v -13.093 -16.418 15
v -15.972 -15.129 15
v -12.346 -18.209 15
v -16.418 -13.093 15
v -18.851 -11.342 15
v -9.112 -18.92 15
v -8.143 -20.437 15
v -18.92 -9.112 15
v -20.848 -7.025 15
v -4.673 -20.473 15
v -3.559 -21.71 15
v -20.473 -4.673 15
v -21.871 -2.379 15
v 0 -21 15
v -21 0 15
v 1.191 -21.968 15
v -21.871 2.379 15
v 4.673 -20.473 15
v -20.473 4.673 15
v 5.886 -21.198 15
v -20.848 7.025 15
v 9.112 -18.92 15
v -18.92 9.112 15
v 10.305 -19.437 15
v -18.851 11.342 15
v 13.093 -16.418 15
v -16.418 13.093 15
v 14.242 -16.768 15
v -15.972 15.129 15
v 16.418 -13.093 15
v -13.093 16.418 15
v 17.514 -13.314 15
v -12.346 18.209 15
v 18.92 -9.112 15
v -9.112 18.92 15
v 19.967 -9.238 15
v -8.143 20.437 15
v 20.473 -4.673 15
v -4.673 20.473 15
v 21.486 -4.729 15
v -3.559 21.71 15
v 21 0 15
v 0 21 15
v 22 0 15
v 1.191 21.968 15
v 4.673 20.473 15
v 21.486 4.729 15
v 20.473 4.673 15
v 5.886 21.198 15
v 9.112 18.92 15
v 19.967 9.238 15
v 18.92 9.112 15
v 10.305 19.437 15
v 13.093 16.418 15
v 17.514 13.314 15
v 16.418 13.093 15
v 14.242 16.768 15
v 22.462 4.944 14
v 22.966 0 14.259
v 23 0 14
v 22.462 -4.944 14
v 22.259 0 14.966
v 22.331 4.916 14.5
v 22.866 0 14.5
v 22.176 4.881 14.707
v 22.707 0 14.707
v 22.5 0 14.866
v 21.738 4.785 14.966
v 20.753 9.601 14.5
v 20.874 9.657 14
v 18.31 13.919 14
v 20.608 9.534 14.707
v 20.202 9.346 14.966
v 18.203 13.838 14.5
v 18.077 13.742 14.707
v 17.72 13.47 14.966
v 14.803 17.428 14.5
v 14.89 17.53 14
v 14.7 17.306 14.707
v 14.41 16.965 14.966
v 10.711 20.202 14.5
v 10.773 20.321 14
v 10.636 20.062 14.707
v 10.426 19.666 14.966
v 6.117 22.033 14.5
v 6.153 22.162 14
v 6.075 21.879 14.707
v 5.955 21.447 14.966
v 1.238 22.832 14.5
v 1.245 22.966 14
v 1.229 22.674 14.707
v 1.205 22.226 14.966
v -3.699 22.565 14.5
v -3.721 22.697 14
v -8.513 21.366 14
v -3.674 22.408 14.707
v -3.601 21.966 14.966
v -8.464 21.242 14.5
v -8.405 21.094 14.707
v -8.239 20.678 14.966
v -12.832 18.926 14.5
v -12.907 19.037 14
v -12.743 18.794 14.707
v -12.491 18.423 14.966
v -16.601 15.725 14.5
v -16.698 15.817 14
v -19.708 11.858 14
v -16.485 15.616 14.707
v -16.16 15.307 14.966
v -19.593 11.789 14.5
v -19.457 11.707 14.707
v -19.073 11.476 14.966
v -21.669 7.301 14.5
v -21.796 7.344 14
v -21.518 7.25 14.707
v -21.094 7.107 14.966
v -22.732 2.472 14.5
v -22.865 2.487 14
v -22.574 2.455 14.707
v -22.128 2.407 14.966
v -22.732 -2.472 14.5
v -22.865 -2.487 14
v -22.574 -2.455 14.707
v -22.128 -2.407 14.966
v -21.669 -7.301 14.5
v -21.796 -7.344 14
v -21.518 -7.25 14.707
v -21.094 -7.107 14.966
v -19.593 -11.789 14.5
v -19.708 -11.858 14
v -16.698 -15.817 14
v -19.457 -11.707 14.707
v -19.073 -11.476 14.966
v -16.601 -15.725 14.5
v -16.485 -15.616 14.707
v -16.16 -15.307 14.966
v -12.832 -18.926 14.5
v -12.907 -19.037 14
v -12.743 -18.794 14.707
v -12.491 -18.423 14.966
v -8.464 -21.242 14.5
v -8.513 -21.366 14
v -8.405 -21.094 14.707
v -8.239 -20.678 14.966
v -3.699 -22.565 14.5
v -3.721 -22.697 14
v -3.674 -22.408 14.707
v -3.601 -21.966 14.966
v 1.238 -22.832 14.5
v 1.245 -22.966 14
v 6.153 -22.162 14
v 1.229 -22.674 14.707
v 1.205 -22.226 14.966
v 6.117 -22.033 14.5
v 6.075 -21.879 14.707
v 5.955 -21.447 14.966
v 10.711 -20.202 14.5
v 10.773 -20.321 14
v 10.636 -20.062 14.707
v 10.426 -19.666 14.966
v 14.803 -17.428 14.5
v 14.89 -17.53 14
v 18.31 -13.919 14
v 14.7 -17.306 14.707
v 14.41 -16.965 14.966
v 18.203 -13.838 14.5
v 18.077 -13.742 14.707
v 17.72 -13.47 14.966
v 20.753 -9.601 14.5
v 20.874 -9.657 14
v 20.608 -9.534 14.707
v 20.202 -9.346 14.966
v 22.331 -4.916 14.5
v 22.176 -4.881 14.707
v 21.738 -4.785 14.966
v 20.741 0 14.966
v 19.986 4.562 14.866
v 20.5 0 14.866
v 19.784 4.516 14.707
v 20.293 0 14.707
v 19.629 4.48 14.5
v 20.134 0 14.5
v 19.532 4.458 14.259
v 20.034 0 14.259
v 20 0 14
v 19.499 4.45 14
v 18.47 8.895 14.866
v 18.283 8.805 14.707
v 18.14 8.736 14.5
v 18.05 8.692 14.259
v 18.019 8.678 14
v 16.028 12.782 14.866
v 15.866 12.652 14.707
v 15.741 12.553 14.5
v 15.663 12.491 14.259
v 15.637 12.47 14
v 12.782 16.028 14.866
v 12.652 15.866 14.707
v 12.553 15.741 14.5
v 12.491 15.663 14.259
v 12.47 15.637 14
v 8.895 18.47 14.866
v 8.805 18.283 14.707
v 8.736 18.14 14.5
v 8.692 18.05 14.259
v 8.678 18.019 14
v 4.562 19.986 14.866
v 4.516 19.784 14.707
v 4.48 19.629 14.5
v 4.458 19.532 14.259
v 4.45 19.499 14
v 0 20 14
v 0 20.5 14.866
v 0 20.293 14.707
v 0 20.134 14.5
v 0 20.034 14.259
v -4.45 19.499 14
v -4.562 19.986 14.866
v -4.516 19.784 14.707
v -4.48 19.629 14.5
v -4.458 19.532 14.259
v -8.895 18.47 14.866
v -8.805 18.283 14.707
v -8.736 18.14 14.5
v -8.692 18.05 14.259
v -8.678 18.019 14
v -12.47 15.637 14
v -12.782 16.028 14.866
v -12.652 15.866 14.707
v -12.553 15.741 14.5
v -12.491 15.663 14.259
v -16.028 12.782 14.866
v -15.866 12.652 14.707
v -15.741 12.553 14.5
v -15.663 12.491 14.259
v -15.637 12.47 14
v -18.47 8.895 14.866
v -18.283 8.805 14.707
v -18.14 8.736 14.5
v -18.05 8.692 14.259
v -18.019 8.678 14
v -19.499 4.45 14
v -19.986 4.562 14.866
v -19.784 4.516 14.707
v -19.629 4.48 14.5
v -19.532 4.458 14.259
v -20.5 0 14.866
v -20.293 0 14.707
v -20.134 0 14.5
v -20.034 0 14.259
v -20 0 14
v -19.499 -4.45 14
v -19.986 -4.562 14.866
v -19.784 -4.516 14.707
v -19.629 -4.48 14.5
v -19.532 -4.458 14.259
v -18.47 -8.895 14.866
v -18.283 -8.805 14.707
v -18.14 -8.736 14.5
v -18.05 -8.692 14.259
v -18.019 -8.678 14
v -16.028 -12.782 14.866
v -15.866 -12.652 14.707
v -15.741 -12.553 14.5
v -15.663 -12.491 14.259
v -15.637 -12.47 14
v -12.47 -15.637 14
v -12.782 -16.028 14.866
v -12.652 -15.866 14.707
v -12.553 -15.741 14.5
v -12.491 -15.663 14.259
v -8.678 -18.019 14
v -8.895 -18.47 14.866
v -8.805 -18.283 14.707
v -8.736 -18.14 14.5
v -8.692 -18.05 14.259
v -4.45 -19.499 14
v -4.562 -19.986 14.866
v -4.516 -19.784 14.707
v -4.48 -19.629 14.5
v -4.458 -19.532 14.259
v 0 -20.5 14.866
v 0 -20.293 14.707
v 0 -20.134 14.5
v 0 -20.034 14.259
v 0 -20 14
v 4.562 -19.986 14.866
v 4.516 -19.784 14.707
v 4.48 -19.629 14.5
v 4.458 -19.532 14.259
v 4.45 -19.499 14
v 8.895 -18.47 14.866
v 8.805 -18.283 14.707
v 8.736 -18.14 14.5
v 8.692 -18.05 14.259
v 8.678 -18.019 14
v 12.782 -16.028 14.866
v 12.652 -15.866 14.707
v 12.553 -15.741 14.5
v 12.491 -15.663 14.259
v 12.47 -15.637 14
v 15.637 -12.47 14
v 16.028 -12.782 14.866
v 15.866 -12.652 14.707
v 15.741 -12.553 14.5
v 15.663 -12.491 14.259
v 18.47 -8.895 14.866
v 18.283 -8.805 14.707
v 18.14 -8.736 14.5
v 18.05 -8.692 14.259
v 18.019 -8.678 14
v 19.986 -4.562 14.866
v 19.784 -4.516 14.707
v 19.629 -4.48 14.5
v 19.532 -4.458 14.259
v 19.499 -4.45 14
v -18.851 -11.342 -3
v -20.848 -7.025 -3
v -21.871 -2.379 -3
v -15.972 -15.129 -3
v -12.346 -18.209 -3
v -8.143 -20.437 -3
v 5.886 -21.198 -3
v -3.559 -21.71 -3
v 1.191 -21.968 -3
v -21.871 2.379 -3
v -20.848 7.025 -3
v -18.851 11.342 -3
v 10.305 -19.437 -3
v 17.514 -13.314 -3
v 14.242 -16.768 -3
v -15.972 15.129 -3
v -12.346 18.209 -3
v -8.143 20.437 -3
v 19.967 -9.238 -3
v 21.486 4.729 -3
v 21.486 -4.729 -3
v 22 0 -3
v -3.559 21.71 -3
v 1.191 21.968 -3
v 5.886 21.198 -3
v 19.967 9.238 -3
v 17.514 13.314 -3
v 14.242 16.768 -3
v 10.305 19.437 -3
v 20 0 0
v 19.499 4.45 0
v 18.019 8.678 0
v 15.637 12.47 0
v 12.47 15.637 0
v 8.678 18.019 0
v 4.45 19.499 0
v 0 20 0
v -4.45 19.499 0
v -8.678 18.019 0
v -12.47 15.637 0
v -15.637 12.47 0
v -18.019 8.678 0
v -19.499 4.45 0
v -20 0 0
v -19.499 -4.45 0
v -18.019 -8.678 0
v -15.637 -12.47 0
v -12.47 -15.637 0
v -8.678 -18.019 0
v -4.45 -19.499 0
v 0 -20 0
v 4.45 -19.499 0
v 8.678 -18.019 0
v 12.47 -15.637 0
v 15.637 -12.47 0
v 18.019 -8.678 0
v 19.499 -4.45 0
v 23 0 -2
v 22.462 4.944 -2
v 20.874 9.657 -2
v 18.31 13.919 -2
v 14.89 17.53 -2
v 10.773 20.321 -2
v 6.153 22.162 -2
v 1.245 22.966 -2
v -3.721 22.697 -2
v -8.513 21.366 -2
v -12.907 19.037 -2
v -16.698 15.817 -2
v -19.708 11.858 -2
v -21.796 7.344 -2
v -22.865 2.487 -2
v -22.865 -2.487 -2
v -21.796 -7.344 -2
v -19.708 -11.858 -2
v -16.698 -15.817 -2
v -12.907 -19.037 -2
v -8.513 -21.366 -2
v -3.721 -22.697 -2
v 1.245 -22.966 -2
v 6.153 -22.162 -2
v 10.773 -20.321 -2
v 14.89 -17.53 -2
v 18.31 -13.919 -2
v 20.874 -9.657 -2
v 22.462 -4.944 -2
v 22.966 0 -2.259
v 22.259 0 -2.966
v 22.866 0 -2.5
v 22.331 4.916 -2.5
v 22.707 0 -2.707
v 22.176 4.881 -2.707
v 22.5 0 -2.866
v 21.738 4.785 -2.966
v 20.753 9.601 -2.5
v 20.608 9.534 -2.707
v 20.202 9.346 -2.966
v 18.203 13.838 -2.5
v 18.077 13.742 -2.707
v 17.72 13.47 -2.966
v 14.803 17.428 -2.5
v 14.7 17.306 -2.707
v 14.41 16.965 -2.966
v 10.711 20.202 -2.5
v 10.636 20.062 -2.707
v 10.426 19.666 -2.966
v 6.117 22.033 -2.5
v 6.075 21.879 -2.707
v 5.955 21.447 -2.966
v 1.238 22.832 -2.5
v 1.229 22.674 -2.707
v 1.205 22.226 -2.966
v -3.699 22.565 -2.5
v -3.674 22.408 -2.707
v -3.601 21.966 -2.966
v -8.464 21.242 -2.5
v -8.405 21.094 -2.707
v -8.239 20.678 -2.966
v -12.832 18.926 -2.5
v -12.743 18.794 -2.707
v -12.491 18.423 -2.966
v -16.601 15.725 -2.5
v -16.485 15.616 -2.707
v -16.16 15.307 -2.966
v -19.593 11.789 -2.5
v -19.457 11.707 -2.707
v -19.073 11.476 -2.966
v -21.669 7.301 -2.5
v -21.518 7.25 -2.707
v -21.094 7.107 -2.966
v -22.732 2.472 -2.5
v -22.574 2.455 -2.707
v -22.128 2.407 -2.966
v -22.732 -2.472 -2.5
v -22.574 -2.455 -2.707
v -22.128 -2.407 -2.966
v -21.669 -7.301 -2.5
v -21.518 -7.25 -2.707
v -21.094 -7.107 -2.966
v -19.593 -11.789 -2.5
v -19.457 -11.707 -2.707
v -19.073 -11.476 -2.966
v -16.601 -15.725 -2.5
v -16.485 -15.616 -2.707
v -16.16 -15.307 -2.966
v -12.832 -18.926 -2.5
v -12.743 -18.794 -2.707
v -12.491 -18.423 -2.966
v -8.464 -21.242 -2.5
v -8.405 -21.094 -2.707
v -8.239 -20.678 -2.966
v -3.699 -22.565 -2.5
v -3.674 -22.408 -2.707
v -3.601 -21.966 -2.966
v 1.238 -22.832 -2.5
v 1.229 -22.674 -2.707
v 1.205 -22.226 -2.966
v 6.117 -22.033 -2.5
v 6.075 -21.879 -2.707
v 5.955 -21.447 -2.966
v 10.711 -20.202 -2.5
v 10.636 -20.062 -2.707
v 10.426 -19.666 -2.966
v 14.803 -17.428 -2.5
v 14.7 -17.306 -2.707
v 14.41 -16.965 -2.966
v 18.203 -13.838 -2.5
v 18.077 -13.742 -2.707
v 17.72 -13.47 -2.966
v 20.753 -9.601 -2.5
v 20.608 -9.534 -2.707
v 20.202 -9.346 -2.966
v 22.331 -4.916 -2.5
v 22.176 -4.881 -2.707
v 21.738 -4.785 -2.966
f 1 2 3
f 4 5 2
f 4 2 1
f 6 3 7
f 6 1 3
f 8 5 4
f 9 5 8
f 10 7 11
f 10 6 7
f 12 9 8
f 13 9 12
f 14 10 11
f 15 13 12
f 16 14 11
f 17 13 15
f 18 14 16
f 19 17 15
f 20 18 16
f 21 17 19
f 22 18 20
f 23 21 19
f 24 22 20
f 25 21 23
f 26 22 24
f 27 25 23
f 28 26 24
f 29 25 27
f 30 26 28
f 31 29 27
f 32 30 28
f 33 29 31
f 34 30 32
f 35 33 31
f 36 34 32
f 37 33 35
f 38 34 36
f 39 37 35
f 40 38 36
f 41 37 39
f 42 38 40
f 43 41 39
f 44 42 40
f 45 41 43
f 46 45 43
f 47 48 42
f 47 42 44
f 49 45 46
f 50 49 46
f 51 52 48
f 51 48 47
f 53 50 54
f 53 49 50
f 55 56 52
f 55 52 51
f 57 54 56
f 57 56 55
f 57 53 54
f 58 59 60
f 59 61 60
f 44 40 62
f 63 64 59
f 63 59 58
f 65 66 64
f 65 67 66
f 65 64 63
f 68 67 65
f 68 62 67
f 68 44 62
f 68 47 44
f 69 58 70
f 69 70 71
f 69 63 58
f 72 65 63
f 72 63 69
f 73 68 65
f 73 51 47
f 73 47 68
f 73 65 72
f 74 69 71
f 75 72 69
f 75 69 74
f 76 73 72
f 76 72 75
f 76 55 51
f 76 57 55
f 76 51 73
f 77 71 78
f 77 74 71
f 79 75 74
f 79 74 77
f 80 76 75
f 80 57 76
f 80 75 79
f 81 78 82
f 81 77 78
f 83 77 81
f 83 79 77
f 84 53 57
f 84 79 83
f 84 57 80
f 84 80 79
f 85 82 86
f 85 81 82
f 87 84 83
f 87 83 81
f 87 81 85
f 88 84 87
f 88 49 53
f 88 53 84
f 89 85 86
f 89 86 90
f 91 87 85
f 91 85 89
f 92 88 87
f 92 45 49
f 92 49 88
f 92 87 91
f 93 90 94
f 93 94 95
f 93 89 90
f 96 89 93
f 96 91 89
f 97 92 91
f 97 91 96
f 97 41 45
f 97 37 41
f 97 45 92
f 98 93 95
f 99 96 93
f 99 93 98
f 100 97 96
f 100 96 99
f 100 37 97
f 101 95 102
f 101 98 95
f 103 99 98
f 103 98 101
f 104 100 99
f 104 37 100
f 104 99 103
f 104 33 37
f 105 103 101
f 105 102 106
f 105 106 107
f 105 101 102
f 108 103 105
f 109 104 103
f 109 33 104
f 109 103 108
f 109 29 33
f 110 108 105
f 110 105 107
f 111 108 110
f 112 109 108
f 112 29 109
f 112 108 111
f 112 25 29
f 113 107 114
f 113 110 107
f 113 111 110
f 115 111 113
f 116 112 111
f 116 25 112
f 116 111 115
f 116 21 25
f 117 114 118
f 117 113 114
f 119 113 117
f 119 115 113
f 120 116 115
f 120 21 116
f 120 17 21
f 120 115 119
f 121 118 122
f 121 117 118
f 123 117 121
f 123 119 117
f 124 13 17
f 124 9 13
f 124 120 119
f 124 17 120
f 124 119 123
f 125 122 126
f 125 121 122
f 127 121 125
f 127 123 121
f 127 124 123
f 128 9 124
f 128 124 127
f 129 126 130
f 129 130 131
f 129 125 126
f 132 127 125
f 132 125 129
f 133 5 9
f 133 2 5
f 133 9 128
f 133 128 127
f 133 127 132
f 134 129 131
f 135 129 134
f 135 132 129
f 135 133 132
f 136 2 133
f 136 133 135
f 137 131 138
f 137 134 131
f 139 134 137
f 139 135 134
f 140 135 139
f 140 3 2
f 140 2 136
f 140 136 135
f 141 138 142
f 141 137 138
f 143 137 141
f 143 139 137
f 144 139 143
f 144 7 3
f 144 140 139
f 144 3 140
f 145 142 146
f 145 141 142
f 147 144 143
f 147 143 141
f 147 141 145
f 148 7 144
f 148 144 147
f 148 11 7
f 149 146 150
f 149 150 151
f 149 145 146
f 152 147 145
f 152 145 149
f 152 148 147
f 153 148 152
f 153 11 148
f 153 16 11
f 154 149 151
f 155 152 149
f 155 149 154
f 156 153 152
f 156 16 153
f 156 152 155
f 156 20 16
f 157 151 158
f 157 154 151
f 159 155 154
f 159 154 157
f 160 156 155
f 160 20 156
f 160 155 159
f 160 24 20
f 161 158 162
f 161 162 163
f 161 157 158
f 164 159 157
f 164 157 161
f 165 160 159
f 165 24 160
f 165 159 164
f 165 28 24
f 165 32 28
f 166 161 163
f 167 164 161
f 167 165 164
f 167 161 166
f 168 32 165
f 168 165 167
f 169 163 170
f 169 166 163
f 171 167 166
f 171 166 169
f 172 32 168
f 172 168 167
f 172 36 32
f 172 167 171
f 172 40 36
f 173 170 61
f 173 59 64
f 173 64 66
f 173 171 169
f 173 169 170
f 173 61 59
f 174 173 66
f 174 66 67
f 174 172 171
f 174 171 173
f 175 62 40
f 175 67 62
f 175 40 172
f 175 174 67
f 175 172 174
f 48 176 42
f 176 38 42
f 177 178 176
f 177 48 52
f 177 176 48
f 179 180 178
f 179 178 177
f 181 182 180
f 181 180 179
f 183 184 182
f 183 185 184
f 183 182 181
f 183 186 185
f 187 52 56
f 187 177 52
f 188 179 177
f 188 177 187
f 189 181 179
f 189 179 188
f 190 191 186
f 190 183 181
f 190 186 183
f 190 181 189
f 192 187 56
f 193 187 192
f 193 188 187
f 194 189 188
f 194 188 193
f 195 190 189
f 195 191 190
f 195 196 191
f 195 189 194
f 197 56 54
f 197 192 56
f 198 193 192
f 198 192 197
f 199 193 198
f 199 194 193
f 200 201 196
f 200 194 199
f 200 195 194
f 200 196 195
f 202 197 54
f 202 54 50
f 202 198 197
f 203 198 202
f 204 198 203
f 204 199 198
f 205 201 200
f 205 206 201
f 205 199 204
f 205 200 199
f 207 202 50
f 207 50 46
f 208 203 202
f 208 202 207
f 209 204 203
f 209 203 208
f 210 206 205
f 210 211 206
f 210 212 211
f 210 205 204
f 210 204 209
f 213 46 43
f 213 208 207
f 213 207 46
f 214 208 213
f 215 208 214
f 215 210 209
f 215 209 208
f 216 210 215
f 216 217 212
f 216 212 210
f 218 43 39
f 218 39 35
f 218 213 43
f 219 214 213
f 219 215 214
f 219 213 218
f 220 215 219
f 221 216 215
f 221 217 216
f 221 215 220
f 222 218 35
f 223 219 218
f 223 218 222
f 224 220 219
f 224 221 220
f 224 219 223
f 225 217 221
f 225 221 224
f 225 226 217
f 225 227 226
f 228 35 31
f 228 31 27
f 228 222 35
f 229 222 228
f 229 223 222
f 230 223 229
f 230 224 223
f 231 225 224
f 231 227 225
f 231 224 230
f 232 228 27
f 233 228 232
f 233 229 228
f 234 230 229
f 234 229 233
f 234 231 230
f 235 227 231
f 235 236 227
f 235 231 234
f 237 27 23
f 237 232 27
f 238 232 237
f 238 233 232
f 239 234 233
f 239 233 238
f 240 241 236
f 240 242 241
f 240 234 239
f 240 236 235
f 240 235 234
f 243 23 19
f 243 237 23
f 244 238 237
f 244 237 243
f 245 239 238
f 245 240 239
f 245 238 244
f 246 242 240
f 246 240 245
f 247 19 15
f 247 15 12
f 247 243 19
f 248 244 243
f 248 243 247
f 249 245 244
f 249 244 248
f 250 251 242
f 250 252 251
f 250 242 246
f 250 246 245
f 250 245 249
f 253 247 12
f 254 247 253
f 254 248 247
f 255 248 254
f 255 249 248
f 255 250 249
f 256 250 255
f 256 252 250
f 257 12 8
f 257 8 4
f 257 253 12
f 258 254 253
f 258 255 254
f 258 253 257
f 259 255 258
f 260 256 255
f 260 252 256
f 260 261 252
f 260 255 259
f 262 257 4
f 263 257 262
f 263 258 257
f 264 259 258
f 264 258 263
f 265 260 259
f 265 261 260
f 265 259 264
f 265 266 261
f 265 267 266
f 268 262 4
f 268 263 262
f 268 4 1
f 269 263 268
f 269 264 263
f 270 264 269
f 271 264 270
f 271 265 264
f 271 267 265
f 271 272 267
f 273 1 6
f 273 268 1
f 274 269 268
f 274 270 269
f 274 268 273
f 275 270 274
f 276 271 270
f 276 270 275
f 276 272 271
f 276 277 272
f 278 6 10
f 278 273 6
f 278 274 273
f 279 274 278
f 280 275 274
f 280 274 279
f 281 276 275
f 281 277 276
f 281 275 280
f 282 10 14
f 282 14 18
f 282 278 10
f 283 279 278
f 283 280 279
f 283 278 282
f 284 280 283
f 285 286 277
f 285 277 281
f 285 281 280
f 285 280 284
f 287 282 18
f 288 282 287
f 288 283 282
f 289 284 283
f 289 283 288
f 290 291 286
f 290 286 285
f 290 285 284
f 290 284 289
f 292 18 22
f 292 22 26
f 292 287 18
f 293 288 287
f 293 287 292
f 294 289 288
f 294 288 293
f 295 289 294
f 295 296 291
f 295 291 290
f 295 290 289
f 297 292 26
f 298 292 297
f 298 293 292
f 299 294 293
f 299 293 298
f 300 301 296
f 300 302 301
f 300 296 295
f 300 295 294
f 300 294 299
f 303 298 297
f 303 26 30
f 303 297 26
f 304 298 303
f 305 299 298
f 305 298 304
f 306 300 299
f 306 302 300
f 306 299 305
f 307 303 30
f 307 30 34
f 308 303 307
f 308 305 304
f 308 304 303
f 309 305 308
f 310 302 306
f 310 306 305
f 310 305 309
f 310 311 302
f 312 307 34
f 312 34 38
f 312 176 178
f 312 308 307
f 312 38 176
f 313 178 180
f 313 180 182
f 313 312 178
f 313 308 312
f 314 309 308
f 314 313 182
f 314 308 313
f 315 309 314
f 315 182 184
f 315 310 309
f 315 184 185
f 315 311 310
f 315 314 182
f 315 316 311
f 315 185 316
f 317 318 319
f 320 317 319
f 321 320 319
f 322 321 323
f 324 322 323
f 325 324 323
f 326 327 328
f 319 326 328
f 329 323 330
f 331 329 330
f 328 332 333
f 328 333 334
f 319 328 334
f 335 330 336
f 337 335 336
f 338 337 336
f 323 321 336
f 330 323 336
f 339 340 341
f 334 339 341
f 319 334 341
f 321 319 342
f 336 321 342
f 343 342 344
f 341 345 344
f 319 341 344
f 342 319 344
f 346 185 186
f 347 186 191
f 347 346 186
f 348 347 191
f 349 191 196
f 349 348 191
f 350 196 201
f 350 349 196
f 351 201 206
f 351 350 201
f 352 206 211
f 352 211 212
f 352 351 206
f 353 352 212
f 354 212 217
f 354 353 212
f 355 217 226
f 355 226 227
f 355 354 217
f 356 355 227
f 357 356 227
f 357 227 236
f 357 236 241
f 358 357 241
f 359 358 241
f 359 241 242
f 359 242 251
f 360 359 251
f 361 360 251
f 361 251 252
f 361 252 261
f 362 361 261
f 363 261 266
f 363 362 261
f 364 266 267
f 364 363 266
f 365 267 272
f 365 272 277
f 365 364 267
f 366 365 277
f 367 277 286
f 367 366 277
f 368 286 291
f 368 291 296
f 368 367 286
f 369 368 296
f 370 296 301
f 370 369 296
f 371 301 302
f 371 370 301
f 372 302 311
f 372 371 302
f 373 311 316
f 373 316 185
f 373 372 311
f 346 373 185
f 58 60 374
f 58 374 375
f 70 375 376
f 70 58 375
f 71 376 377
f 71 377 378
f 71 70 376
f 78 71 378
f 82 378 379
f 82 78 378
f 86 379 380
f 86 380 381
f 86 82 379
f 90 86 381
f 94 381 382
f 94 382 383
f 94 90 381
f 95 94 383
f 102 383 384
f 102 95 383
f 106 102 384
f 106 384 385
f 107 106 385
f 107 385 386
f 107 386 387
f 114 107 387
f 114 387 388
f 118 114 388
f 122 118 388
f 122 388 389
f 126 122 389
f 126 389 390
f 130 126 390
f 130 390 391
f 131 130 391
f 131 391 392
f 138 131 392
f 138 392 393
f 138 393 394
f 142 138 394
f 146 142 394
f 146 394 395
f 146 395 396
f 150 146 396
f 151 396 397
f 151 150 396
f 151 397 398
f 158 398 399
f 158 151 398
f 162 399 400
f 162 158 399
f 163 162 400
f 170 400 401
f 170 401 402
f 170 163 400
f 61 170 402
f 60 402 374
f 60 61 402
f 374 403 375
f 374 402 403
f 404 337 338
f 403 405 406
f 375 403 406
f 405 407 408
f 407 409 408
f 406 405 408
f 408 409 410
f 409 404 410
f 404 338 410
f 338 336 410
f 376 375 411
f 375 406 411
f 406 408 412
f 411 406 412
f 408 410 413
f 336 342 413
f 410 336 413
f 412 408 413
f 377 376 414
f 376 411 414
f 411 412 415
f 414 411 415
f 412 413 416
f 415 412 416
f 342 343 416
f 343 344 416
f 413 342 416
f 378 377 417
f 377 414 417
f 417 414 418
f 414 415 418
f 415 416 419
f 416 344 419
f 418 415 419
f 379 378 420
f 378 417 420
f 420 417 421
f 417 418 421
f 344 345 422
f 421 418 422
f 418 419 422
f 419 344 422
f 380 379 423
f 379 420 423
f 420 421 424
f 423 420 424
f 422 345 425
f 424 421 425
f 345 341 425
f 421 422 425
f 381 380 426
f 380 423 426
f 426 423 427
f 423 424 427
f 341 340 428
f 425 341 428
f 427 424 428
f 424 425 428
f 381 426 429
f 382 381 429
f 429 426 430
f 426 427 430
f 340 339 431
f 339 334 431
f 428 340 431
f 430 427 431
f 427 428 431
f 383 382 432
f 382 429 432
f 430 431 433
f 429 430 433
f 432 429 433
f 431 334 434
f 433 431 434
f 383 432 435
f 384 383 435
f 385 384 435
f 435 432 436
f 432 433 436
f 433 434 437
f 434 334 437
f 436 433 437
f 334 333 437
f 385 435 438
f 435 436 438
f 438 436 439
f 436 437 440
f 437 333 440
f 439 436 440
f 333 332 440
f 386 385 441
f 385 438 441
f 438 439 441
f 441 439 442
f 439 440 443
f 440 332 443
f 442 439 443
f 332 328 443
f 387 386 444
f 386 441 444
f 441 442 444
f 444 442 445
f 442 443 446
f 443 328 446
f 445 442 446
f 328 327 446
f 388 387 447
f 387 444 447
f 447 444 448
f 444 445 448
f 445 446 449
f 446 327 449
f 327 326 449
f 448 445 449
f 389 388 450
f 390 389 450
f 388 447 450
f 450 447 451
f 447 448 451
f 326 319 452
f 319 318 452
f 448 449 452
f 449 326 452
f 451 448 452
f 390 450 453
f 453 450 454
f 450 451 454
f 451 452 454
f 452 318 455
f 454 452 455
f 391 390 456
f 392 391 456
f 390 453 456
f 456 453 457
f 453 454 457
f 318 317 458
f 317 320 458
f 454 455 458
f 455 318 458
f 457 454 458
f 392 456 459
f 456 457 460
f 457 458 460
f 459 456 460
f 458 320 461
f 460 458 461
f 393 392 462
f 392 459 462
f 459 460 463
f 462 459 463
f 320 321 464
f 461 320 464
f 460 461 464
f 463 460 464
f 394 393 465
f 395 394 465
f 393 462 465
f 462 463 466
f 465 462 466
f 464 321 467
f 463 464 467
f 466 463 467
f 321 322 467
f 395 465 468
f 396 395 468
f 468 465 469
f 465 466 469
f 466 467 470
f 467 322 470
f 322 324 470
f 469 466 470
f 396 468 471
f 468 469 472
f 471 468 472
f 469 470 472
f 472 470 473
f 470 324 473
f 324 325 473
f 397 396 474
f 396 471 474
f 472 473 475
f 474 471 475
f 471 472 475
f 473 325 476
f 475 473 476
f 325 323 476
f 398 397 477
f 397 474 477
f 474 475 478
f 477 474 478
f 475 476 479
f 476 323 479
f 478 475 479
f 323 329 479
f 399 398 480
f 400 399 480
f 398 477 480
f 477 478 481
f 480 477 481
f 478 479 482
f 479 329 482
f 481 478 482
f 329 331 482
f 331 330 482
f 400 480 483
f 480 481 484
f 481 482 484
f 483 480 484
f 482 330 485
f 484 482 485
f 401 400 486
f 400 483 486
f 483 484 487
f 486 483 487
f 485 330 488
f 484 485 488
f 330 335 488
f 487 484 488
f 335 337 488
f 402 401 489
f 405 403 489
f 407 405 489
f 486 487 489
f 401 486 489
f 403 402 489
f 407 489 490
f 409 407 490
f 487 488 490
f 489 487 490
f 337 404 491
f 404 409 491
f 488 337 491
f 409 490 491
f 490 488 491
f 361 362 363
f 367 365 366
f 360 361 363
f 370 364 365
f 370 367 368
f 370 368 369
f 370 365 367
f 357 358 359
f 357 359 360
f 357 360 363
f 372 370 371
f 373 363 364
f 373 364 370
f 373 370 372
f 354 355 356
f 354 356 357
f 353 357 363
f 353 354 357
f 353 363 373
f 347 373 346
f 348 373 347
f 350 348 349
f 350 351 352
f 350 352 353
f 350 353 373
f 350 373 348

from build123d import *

# Parameters (mm, degrees)
F0_R     = 23
F0_R_2   = 20
F1_DEPTH = 15
F2_R     = 23
F3_DEPTH = 3
F4_R     = 1


with BuildPart() as f1:
    # F0 (on Top) → F1 (new body)
    with BuildSketch(Plane.XY):
        Circle(F0_R)
        Circle(F0_R_2, mode=Mode.SUBTRACT)
    extrude(amount=F1_DEPTH)

    # F2 (on Top) → F3 (join)
    with BuildSketch(Plane.XY):
        Circle(F2_R)
    extrude(amount=-F3_DEPTH)

    # F4
    f4_edges = [f1.edges().sort_by_distance(p)[0] for p in [
        (-23, 0, 15),
        (-20, 0, 15),
        (23, 0, 7.5),
        (-23, 0, 0),
    ]]
    fillet(f4_edges, radius=F4_R)


solid = f1.part
